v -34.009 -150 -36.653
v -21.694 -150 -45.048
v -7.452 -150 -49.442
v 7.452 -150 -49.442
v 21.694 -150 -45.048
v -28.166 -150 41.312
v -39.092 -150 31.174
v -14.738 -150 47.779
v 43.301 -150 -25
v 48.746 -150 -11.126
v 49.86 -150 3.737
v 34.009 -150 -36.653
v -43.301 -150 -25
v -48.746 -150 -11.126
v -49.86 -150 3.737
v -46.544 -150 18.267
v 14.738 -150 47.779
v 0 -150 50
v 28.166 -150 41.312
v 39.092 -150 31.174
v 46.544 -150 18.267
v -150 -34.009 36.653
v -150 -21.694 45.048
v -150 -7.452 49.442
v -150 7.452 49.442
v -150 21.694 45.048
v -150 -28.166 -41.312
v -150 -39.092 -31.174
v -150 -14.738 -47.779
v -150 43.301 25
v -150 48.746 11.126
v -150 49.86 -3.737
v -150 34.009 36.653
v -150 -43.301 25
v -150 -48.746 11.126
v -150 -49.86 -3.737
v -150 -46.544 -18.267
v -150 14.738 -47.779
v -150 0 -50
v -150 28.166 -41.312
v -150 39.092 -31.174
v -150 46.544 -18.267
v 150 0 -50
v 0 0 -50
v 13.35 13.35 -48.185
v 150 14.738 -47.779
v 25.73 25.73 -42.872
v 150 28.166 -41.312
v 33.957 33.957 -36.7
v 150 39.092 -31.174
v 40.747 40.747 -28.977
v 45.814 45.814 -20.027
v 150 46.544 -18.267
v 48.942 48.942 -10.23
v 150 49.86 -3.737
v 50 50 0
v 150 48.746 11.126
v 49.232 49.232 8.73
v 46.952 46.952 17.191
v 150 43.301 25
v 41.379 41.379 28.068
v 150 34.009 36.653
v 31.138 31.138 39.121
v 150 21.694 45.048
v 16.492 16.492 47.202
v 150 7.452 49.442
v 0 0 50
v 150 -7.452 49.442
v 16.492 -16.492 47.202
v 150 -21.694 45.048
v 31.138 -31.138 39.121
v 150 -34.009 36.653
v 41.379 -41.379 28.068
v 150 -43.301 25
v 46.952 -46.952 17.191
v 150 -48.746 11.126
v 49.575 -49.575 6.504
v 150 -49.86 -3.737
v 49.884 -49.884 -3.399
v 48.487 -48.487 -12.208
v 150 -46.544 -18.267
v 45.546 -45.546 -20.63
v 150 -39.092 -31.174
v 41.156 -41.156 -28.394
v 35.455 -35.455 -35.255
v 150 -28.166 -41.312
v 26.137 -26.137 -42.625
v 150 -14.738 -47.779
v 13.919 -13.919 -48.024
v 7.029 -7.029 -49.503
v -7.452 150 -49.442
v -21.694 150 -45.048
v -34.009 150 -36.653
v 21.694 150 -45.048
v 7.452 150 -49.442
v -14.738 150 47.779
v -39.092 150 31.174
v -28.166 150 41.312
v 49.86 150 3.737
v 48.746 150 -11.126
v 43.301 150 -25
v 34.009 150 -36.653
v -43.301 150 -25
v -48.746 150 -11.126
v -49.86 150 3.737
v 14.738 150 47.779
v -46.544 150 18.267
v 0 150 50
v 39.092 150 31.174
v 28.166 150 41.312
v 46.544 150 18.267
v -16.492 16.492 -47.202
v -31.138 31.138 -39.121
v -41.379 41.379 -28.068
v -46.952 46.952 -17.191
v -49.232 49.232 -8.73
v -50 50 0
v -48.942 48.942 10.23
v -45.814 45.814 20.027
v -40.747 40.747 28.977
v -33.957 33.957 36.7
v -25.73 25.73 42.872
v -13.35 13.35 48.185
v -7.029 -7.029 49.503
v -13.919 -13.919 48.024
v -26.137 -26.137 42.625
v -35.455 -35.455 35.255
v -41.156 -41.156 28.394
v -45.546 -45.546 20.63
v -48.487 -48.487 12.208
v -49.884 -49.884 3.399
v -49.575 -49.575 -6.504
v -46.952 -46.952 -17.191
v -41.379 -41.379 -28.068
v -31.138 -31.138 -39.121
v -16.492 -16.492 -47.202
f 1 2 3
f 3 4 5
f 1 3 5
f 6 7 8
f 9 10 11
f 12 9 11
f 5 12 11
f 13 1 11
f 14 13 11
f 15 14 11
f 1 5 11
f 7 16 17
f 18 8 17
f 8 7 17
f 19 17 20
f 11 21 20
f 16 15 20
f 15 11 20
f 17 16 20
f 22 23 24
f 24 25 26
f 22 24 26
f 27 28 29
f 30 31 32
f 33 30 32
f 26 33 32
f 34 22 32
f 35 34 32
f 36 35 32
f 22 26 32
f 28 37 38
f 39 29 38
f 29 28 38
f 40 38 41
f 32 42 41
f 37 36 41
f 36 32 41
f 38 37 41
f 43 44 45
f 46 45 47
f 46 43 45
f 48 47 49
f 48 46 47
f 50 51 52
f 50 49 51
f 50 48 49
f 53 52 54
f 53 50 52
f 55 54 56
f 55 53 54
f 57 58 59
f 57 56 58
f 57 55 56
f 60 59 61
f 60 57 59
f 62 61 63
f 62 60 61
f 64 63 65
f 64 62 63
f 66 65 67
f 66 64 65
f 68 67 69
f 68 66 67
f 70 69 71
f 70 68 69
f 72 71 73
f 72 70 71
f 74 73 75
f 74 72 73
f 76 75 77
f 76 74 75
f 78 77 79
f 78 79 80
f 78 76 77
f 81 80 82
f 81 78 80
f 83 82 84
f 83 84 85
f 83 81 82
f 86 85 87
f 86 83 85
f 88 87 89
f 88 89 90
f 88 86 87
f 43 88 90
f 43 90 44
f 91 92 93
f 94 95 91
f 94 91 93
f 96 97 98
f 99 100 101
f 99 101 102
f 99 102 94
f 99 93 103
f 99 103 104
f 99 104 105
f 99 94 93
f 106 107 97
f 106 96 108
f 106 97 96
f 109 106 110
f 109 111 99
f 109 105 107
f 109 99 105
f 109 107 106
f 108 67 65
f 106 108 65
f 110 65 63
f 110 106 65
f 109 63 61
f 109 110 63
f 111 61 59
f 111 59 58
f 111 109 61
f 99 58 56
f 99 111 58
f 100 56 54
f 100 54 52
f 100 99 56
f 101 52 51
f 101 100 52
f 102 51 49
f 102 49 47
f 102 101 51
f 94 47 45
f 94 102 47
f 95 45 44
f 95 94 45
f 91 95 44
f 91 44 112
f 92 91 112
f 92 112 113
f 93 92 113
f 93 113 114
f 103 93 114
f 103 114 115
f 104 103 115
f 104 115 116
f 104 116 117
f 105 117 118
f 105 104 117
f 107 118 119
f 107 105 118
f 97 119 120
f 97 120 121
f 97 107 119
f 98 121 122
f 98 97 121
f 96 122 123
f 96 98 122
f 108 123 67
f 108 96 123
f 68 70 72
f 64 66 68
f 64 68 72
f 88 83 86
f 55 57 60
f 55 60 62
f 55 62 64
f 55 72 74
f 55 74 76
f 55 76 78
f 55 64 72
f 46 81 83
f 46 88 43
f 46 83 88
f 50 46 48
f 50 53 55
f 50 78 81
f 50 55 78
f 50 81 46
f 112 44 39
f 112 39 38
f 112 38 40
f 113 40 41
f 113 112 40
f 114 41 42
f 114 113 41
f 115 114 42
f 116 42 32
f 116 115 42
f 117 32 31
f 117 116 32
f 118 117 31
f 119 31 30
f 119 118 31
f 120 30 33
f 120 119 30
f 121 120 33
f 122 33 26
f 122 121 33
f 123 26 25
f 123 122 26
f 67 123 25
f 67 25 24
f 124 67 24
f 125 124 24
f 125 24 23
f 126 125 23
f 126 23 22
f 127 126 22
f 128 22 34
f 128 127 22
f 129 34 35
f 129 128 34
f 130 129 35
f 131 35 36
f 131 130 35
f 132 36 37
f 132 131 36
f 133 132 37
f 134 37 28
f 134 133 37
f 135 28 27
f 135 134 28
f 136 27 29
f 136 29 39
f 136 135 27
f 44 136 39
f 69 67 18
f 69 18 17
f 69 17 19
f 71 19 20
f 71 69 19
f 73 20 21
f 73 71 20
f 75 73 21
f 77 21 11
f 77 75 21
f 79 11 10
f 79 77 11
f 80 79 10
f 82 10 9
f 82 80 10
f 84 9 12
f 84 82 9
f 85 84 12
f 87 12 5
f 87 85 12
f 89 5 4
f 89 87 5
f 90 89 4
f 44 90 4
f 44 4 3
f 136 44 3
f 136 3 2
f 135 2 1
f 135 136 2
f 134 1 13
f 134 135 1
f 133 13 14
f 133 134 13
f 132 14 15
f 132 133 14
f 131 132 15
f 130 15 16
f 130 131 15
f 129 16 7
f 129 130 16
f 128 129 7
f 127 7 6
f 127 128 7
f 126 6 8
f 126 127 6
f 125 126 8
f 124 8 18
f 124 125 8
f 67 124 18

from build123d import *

# Parameters (mm, degrees)
SKETCH1_R           = 50
BOSS_EXTRUDE1_DEPTH = 150
SKETCH2_R           = 50
BOSS_EXTRUDE2_DEPTH = 150


with BuildPart() as part:
    # Sketch1 → Boss-Extrude1 (new, symmetric)
    with BuildSketch(Plane(origin=(0, 0, 0), x_dir=(1, 0, 0), z_dir=(0, 1, 0))):
        with Locations(Location((0, 0, 0), (0, 0, 270))):
            Circle(SKETCH1_R)
    extrude(amount=BOSS_EXTRUDE1_DEPTH, both=True)

    # Sketch2 → Boss-Extrude2 (add, symmetric)
    with BuildSketch(Plane(origin=(0, 0, 0), x_dir=(0, 0, -1), z_dir=(1, 0, 0))):
        Circle(SKETCH2_R)
    extrude(amount=BOSS_EXTRUDE2_DEPTH, both=True)


solid = part.part
